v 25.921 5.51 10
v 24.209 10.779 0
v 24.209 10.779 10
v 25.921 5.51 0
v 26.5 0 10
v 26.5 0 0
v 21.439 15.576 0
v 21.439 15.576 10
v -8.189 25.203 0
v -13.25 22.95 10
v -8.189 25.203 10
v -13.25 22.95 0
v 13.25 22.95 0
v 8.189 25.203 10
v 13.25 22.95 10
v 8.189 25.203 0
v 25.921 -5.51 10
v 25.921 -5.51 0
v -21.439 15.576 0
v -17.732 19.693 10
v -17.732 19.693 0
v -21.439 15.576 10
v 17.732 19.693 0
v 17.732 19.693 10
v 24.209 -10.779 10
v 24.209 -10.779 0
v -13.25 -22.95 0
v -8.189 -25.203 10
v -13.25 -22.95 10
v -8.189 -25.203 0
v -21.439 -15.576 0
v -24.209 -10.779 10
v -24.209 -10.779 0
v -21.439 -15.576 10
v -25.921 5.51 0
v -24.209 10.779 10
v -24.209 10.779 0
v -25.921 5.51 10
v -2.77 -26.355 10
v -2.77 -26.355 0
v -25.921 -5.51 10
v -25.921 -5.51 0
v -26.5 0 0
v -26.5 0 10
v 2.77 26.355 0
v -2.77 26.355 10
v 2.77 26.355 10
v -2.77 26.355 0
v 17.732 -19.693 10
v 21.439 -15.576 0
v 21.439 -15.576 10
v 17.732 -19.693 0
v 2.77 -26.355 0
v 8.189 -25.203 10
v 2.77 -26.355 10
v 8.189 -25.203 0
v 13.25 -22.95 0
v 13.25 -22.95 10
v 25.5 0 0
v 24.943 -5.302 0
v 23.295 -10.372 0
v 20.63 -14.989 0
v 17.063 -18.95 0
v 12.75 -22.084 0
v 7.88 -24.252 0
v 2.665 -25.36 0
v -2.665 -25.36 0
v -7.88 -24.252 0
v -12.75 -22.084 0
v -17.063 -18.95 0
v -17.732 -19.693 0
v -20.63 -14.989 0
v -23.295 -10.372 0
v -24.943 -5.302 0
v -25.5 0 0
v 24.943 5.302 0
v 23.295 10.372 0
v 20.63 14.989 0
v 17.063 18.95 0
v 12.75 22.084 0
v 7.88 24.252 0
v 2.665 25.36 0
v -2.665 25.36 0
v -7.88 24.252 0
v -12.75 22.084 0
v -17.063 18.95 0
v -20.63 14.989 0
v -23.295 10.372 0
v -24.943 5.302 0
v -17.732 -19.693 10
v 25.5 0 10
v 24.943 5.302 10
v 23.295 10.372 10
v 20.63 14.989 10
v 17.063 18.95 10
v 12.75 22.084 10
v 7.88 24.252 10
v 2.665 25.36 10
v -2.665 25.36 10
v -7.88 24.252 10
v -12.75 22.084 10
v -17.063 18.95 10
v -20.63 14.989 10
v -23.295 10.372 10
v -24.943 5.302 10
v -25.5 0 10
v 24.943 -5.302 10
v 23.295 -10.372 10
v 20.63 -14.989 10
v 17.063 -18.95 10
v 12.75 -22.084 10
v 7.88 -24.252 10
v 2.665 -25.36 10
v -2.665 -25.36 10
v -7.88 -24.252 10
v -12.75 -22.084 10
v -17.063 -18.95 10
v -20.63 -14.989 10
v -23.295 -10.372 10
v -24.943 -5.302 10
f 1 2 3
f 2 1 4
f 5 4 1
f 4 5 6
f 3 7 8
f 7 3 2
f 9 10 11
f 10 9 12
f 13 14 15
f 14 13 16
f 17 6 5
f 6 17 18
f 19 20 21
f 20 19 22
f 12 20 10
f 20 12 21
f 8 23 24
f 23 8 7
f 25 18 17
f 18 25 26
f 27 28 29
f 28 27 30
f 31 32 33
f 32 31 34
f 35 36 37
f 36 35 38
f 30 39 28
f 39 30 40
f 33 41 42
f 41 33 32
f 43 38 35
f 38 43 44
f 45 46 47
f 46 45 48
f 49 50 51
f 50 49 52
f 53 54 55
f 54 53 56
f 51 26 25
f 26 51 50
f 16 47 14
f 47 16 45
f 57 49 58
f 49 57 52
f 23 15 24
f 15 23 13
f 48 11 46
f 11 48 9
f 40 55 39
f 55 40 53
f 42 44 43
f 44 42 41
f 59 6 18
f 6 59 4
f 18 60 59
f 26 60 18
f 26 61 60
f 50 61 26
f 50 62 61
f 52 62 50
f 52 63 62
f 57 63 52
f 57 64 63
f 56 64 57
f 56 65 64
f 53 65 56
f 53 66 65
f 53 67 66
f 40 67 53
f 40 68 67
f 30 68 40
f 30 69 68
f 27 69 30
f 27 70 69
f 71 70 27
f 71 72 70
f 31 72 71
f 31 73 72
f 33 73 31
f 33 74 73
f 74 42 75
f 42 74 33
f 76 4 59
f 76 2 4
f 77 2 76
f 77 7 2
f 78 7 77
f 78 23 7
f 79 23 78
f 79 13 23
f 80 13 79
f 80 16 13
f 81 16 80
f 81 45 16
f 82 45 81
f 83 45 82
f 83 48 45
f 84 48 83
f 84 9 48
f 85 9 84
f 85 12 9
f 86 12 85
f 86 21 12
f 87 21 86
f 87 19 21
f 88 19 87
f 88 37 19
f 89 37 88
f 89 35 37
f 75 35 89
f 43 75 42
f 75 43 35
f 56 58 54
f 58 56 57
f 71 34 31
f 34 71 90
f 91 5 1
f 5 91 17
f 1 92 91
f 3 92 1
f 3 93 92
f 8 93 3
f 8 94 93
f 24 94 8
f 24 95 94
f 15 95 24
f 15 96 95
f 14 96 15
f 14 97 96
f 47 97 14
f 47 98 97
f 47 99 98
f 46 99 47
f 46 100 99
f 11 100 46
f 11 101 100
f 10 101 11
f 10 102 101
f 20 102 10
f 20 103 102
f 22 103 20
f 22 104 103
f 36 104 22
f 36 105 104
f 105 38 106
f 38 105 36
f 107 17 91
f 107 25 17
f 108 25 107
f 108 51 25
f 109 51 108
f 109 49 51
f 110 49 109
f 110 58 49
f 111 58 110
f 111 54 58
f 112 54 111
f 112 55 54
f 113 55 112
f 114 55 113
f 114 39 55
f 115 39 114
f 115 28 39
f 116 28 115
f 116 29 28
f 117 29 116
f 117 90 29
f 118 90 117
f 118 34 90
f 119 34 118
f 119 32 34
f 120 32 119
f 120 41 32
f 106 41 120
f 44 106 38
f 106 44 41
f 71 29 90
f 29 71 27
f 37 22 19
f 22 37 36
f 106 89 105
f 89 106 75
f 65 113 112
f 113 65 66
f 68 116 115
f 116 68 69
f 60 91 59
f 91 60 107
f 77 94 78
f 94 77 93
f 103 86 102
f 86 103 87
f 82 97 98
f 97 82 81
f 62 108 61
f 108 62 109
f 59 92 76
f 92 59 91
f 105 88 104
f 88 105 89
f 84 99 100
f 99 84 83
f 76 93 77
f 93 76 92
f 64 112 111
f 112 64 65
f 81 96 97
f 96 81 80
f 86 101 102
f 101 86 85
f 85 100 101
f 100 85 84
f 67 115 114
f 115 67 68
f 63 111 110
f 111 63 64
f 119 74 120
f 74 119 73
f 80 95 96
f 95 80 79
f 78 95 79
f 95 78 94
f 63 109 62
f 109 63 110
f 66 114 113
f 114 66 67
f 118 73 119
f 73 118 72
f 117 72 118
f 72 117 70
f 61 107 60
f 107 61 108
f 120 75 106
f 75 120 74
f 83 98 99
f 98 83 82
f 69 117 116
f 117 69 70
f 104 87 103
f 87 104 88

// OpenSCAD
/**
 * This work is licensed under a <a rel="license" href="https://creativecommons.org/licenses/by-sa/4.0/">Creative Commons Attribution 4.0 Unported License</a>.
 */

difference() {
    cylinder(r=26.5, h=10);
    translate([0, 0, -10]) {
        cylinder(r=25.5, h=30);
    }
}
